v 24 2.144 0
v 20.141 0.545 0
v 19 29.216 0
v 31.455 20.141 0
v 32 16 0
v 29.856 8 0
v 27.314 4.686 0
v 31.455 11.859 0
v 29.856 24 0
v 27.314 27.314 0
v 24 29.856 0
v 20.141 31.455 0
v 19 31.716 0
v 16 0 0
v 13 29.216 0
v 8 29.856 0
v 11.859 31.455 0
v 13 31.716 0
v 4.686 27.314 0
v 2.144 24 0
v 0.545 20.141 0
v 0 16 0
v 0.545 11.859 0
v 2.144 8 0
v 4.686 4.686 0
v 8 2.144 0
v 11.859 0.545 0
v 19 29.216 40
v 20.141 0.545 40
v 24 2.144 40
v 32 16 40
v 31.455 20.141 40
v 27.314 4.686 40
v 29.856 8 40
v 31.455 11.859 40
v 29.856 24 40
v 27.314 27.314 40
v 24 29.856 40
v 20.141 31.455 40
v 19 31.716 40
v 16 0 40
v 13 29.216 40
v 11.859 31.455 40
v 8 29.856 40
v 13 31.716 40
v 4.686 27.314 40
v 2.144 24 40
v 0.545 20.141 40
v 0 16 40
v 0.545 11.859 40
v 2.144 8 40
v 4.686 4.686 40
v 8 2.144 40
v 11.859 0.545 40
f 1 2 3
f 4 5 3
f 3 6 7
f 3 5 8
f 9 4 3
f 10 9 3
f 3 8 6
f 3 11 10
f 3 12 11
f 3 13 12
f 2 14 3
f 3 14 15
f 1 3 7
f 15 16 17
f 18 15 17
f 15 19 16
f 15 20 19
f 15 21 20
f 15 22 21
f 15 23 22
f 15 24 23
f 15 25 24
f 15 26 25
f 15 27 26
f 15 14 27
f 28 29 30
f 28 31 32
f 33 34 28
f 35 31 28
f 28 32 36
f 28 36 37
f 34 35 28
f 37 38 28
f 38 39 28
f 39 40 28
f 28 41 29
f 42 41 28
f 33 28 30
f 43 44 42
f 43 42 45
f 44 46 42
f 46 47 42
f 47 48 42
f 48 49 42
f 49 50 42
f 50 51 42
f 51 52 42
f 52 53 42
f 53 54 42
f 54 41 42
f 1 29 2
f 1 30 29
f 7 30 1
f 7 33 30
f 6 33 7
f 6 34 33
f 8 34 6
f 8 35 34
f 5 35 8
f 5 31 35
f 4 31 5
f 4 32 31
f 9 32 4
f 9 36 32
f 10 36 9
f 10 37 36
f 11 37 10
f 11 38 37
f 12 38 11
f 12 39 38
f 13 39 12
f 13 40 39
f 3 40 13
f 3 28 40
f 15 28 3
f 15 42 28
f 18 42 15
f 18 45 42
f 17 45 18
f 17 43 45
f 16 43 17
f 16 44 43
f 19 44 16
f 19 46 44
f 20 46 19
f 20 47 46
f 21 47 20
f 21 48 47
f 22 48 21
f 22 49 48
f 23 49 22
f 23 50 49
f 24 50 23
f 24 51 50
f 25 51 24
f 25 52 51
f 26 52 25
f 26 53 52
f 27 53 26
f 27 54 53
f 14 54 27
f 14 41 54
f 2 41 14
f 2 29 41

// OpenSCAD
$fn = 32;

// ----------------------------------------------------------------------
// Keyway shaft: d32 shaft, key 6 x 2.5 mm
// ----------------------------------------------------------------------

// --- parameters (mm) ---
shaft_r = 16;             // shaft radius
key_w = 6;                // keyway width
key_d = 2.5;              // keyway depth below the surface line
plate_t = 40;             // shaft length, Z (extrusion height)

shaft_d = 2 * shaft_r;  // shaft diameter
circle_step = 15;  // polygon sampling step, degrees

profile = [[11.859, 31.455], [8, 29.856], [4.686, 27.314], [2.144, 24], [0.545, 20.141], [0, 16], [0.545, 11.859], [2.144, 8], [4.686, 4.686], [8, 2.144], [11.859, 0.545], [16, 0], [20.141, 0.545], [24, 2.144], [27.314, 4.686], [29.856, 8], [31.455, 11.859], [32, 16], [31.455, 20.141], [29.856, 24], [27.314, 27.314], [24, 29.856], [20.141, 31.455], [19, 31.716], [19, 29.216], [13, 29.216], [13, 31.716]];  // primary outline, 27 points, counter clockwise

// --- the one profile operation ---
linear_extrude(height = plate_t) polygon(points = profile);
